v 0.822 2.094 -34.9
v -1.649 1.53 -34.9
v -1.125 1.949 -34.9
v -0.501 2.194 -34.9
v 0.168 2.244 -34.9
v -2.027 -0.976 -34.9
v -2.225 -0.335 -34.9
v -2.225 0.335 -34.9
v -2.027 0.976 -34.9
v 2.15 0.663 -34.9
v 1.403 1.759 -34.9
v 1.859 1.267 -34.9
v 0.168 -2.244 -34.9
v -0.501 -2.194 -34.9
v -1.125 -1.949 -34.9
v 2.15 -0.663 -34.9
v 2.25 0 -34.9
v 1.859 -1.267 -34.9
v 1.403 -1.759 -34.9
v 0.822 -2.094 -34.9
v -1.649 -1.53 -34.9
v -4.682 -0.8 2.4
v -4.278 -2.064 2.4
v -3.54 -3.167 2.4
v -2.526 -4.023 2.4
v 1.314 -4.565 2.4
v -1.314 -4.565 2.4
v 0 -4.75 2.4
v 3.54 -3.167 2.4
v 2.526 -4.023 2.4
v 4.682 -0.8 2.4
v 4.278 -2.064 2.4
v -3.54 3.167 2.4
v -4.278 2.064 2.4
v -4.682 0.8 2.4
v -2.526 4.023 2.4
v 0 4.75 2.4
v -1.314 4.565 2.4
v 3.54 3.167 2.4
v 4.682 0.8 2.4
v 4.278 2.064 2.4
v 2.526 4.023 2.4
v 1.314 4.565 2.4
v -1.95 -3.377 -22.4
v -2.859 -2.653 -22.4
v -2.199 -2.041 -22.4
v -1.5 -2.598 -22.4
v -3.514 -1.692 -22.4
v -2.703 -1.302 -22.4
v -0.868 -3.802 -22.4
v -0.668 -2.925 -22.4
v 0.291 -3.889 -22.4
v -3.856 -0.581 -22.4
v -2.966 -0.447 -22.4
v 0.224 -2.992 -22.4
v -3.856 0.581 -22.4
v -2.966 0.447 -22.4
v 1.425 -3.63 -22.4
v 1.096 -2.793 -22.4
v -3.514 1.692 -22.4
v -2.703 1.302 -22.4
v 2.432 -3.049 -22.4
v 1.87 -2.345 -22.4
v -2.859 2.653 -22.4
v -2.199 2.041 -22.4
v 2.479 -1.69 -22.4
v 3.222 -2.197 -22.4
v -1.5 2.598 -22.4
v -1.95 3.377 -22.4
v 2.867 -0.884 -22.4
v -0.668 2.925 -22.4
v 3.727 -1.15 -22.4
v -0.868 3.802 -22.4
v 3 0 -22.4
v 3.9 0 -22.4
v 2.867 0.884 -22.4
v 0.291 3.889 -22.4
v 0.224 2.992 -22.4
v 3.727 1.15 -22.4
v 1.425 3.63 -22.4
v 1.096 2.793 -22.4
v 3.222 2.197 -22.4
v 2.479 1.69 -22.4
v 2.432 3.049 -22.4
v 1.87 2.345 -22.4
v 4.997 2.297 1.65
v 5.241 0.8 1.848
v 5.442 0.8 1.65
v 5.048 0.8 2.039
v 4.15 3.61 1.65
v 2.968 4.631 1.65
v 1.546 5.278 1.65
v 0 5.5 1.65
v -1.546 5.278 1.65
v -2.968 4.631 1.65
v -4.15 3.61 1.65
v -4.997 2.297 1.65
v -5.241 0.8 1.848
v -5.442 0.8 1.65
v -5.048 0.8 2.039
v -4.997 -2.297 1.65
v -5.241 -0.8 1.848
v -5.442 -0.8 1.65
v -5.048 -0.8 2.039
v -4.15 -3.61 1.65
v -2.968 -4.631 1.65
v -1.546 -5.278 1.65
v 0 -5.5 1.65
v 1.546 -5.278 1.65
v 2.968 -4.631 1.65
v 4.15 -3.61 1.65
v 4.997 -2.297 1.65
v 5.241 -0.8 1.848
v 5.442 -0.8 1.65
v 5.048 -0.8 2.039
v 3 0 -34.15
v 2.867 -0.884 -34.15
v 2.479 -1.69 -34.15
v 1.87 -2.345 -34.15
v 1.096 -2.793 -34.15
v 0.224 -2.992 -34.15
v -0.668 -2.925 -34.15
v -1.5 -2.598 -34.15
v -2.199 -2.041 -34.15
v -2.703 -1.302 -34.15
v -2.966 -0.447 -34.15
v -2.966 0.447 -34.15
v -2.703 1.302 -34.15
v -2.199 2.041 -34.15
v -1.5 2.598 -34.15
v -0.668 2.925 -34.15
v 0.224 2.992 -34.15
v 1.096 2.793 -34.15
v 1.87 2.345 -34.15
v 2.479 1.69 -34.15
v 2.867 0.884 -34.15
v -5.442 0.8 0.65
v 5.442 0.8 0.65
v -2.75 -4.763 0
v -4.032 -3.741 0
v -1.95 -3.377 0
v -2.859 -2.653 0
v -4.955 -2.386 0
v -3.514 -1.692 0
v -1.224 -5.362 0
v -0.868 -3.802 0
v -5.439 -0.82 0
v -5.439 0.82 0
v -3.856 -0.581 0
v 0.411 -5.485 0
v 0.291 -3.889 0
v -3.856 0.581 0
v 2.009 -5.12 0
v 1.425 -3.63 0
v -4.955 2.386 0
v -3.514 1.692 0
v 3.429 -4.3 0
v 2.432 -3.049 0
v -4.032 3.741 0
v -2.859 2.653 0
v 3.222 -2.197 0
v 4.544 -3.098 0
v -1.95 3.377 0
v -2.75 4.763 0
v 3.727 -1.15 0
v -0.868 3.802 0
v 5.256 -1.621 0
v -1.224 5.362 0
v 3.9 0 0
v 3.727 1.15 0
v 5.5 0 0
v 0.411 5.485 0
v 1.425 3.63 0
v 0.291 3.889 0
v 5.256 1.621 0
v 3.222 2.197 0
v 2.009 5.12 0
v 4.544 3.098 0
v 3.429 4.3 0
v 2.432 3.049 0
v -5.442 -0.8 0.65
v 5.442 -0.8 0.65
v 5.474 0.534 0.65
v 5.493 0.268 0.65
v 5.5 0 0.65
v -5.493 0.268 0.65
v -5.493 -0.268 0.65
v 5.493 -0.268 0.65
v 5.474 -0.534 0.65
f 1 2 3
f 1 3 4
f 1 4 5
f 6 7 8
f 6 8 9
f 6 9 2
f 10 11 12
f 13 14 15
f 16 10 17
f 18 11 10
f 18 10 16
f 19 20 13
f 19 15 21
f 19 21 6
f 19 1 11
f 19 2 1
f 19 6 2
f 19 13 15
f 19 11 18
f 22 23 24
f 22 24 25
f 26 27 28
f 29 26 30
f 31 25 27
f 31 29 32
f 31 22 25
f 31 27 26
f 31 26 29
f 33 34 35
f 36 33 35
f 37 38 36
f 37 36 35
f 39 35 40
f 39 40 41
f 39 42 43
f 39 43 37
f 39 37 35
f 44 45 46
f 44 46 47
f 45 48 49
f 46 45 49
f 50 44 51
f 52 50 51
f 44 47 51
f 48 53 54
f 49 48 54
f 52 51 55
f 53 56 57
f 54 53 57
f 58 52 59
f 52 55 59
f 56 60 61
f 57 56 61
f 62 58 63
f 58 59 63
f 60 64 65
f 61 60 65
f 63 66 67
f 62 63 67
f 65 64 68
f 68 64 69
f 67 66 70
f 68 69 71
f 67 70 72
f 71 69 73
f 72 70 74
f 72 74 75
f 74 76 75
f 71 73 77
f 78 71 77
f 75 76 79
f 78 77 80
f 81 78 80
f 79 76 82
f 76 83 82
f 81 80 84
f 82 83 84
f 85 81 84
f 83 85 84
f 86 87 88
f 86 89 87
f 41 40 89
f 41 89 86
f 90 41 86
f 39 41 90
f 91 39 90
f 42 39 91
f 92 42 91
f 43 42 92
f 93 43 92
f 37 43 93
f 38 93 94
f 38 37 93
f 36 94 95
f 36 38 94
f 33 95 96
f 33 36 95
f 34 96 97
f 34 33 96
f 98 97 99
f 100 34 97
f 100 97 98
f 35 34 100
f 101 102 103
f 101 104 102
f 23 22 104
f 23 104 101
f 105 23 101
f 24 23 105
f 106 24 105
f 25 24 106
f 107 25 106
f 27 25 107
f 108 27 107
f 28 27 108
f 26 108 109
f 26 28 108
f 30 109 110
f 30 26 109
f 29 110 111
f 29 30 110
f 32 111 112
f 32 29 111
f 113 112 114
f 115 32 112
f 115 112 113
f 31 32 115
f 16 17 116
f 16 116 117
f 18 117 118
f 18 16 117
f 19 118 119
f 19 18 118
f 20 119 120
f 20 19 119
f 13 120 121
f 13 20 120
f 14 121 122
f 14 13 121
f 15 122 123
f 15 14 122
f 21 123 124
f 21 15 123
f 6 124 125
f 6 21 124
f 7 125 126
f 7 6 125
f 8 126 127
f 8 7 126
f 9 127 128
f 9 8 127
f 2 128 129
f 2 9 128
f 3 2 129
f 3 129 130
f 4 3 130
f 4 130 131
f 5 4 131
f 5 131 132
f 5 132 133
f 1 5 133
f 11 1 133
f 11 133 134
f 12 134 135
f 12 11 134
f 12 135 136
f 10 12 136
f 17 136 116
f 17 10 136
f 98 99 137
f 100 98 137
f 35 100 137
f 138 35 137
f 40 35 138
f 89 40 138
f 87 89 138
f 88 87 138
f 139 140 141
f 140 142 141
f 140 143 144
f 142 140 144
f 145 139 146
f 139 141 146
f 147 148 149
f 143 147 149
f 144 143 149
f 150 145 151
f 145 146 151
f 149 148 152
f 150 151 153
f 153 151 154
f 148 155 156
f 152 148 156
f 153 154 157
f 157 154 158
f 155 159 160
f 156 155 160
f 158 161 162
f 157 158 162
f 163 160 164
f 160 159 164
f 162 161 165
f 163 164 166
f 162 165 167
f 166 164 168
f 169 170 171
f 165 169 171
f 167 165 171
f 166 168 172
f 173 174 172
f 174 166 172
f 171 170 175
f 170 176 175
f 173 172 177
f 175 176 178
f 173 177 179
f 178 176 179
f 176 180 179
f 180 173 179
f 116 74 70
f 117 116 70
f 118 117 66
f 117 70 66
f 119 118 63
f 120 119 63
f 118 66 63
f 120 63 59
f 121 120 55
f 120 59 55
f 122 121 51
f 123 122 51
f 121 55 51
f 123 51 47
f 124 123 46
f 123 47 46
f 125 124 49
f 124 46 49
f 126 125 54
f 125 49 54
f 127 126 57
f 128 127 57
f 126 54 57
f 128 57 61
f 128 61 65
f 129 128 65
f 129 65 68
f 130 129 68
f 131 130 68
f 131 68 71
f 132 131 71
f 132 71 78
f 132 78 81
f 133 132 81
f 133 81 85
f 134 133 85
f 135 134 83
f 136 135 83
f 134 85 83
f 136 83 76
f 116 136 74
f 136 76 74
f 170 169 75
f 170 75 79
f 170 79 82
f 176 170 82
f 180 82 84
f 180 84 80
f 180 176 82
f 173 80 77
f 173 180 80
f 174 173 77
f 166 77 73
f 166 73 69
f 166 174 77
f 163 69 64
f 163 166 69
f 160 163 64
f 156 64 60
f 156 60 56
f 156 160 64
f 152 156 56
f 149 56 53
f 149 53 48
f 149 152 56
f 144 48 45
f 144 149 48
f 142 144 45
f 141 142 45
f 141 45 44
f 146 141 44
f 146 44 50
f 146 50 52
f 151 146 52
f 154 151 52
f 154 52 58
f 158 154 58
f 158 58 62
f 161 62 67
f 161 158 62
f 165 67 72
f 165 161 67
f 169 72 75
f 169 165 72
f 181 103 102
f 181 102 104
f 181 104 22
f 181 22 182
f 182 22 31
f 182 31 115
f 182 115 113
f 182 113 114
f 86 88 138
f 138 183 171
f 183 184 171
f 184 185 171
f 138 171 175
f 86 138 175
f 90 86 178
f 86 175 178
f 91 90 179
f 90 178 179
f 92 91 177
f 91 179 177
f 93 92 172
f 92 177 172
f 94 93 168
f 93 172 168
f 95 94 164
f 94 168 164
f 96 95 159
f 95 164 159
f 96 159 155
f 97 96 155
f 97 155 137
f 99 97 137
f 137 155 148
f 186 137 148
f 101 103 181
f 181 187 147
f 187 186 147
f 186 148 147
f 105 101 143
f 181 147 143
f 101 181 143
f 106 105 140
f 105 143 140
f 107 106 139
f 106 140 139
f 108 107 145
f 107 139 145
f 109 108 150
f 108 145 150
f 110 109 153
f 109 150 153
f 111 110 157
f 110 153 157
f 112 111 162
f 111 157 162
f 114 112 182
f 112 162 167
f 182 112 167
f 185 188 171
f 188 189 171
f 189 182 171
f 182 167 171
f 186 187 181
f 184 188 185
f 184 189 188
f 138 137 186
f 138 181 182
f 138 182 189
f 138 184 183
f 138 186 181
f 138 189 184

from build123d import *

# Parameters (mm, degrees)
SKETCH1_R          = 3.9
EXTRUDE1_DEPTH     = 22.4
SKETCH2_R          = 3
EXTRUDE2_DEPTH     = 12.5
SKETCH3_R          = 5.5
EXTRUDE3_DEPTH     = 2.4
CHAMFER1_SIZE      = 0.75
SKETCH4_W          = 11
SKETCH4_H          = 1.6
CUT_EXTRUDE1_DEPTH = 1.75
CHAMFER2_SIZE      = 0.75


with BuildPart() as part:
    # Sketch1 → Extrude1 (new body)
    with BuildSketch(Plane.XY):
        Circle(SKETCH1_R)
    extrude(amount=-EXTRUDE1_DEPTH)

    # Sketch2 → Extrude2 (add)
    with BuildSketch(Plane(origin=(0, 0, -22.4), x_dir=(-1, 0, 0), z_dir=(0, 0, -1))):
        with Locations(Location((0, 0, 0), (0, 0, 180))):
            Circle(SKETCH2_R)
    extrude(amount=EXTRUDE2_DEPTH)

    # Sketch3 → Extrude3 (add)
    with BuildSketch(Plane.XY):
        Circle(SKETCH3_R)
    extrude(amount=EXTRUDE3_DEPTH)

    # Chamfer1
    chamfer1_edges = [part.edges().sort_by_distance(p)[0] for p in [
        (-3, 0, -34.9),
    ]]
    chamfer(chamfer1_edges, length=CHAMFER1_SIZE)

    # Sketch4 → Cut-Extrude1 (cut)
    with BuildSketch(Plane.XY.offset(2.4)):
        Rectangle(SKETCH4_W, SKETCH4_H)
    extrude(amount=-CUT_EXTRUDE1_DEPTH, mode=Mode.SUBTRACT)

    # Chamfer2
    chamfer2_edges = [part.edges().sort_by_distance(p)[0] for p in [
        (0, 5.5, 2.4),
        (0, -5.5, 2.4),
    ]]
    chamfer(chamfer2_edges, length=CHAMFER2_SIZE)


solid = part.part
